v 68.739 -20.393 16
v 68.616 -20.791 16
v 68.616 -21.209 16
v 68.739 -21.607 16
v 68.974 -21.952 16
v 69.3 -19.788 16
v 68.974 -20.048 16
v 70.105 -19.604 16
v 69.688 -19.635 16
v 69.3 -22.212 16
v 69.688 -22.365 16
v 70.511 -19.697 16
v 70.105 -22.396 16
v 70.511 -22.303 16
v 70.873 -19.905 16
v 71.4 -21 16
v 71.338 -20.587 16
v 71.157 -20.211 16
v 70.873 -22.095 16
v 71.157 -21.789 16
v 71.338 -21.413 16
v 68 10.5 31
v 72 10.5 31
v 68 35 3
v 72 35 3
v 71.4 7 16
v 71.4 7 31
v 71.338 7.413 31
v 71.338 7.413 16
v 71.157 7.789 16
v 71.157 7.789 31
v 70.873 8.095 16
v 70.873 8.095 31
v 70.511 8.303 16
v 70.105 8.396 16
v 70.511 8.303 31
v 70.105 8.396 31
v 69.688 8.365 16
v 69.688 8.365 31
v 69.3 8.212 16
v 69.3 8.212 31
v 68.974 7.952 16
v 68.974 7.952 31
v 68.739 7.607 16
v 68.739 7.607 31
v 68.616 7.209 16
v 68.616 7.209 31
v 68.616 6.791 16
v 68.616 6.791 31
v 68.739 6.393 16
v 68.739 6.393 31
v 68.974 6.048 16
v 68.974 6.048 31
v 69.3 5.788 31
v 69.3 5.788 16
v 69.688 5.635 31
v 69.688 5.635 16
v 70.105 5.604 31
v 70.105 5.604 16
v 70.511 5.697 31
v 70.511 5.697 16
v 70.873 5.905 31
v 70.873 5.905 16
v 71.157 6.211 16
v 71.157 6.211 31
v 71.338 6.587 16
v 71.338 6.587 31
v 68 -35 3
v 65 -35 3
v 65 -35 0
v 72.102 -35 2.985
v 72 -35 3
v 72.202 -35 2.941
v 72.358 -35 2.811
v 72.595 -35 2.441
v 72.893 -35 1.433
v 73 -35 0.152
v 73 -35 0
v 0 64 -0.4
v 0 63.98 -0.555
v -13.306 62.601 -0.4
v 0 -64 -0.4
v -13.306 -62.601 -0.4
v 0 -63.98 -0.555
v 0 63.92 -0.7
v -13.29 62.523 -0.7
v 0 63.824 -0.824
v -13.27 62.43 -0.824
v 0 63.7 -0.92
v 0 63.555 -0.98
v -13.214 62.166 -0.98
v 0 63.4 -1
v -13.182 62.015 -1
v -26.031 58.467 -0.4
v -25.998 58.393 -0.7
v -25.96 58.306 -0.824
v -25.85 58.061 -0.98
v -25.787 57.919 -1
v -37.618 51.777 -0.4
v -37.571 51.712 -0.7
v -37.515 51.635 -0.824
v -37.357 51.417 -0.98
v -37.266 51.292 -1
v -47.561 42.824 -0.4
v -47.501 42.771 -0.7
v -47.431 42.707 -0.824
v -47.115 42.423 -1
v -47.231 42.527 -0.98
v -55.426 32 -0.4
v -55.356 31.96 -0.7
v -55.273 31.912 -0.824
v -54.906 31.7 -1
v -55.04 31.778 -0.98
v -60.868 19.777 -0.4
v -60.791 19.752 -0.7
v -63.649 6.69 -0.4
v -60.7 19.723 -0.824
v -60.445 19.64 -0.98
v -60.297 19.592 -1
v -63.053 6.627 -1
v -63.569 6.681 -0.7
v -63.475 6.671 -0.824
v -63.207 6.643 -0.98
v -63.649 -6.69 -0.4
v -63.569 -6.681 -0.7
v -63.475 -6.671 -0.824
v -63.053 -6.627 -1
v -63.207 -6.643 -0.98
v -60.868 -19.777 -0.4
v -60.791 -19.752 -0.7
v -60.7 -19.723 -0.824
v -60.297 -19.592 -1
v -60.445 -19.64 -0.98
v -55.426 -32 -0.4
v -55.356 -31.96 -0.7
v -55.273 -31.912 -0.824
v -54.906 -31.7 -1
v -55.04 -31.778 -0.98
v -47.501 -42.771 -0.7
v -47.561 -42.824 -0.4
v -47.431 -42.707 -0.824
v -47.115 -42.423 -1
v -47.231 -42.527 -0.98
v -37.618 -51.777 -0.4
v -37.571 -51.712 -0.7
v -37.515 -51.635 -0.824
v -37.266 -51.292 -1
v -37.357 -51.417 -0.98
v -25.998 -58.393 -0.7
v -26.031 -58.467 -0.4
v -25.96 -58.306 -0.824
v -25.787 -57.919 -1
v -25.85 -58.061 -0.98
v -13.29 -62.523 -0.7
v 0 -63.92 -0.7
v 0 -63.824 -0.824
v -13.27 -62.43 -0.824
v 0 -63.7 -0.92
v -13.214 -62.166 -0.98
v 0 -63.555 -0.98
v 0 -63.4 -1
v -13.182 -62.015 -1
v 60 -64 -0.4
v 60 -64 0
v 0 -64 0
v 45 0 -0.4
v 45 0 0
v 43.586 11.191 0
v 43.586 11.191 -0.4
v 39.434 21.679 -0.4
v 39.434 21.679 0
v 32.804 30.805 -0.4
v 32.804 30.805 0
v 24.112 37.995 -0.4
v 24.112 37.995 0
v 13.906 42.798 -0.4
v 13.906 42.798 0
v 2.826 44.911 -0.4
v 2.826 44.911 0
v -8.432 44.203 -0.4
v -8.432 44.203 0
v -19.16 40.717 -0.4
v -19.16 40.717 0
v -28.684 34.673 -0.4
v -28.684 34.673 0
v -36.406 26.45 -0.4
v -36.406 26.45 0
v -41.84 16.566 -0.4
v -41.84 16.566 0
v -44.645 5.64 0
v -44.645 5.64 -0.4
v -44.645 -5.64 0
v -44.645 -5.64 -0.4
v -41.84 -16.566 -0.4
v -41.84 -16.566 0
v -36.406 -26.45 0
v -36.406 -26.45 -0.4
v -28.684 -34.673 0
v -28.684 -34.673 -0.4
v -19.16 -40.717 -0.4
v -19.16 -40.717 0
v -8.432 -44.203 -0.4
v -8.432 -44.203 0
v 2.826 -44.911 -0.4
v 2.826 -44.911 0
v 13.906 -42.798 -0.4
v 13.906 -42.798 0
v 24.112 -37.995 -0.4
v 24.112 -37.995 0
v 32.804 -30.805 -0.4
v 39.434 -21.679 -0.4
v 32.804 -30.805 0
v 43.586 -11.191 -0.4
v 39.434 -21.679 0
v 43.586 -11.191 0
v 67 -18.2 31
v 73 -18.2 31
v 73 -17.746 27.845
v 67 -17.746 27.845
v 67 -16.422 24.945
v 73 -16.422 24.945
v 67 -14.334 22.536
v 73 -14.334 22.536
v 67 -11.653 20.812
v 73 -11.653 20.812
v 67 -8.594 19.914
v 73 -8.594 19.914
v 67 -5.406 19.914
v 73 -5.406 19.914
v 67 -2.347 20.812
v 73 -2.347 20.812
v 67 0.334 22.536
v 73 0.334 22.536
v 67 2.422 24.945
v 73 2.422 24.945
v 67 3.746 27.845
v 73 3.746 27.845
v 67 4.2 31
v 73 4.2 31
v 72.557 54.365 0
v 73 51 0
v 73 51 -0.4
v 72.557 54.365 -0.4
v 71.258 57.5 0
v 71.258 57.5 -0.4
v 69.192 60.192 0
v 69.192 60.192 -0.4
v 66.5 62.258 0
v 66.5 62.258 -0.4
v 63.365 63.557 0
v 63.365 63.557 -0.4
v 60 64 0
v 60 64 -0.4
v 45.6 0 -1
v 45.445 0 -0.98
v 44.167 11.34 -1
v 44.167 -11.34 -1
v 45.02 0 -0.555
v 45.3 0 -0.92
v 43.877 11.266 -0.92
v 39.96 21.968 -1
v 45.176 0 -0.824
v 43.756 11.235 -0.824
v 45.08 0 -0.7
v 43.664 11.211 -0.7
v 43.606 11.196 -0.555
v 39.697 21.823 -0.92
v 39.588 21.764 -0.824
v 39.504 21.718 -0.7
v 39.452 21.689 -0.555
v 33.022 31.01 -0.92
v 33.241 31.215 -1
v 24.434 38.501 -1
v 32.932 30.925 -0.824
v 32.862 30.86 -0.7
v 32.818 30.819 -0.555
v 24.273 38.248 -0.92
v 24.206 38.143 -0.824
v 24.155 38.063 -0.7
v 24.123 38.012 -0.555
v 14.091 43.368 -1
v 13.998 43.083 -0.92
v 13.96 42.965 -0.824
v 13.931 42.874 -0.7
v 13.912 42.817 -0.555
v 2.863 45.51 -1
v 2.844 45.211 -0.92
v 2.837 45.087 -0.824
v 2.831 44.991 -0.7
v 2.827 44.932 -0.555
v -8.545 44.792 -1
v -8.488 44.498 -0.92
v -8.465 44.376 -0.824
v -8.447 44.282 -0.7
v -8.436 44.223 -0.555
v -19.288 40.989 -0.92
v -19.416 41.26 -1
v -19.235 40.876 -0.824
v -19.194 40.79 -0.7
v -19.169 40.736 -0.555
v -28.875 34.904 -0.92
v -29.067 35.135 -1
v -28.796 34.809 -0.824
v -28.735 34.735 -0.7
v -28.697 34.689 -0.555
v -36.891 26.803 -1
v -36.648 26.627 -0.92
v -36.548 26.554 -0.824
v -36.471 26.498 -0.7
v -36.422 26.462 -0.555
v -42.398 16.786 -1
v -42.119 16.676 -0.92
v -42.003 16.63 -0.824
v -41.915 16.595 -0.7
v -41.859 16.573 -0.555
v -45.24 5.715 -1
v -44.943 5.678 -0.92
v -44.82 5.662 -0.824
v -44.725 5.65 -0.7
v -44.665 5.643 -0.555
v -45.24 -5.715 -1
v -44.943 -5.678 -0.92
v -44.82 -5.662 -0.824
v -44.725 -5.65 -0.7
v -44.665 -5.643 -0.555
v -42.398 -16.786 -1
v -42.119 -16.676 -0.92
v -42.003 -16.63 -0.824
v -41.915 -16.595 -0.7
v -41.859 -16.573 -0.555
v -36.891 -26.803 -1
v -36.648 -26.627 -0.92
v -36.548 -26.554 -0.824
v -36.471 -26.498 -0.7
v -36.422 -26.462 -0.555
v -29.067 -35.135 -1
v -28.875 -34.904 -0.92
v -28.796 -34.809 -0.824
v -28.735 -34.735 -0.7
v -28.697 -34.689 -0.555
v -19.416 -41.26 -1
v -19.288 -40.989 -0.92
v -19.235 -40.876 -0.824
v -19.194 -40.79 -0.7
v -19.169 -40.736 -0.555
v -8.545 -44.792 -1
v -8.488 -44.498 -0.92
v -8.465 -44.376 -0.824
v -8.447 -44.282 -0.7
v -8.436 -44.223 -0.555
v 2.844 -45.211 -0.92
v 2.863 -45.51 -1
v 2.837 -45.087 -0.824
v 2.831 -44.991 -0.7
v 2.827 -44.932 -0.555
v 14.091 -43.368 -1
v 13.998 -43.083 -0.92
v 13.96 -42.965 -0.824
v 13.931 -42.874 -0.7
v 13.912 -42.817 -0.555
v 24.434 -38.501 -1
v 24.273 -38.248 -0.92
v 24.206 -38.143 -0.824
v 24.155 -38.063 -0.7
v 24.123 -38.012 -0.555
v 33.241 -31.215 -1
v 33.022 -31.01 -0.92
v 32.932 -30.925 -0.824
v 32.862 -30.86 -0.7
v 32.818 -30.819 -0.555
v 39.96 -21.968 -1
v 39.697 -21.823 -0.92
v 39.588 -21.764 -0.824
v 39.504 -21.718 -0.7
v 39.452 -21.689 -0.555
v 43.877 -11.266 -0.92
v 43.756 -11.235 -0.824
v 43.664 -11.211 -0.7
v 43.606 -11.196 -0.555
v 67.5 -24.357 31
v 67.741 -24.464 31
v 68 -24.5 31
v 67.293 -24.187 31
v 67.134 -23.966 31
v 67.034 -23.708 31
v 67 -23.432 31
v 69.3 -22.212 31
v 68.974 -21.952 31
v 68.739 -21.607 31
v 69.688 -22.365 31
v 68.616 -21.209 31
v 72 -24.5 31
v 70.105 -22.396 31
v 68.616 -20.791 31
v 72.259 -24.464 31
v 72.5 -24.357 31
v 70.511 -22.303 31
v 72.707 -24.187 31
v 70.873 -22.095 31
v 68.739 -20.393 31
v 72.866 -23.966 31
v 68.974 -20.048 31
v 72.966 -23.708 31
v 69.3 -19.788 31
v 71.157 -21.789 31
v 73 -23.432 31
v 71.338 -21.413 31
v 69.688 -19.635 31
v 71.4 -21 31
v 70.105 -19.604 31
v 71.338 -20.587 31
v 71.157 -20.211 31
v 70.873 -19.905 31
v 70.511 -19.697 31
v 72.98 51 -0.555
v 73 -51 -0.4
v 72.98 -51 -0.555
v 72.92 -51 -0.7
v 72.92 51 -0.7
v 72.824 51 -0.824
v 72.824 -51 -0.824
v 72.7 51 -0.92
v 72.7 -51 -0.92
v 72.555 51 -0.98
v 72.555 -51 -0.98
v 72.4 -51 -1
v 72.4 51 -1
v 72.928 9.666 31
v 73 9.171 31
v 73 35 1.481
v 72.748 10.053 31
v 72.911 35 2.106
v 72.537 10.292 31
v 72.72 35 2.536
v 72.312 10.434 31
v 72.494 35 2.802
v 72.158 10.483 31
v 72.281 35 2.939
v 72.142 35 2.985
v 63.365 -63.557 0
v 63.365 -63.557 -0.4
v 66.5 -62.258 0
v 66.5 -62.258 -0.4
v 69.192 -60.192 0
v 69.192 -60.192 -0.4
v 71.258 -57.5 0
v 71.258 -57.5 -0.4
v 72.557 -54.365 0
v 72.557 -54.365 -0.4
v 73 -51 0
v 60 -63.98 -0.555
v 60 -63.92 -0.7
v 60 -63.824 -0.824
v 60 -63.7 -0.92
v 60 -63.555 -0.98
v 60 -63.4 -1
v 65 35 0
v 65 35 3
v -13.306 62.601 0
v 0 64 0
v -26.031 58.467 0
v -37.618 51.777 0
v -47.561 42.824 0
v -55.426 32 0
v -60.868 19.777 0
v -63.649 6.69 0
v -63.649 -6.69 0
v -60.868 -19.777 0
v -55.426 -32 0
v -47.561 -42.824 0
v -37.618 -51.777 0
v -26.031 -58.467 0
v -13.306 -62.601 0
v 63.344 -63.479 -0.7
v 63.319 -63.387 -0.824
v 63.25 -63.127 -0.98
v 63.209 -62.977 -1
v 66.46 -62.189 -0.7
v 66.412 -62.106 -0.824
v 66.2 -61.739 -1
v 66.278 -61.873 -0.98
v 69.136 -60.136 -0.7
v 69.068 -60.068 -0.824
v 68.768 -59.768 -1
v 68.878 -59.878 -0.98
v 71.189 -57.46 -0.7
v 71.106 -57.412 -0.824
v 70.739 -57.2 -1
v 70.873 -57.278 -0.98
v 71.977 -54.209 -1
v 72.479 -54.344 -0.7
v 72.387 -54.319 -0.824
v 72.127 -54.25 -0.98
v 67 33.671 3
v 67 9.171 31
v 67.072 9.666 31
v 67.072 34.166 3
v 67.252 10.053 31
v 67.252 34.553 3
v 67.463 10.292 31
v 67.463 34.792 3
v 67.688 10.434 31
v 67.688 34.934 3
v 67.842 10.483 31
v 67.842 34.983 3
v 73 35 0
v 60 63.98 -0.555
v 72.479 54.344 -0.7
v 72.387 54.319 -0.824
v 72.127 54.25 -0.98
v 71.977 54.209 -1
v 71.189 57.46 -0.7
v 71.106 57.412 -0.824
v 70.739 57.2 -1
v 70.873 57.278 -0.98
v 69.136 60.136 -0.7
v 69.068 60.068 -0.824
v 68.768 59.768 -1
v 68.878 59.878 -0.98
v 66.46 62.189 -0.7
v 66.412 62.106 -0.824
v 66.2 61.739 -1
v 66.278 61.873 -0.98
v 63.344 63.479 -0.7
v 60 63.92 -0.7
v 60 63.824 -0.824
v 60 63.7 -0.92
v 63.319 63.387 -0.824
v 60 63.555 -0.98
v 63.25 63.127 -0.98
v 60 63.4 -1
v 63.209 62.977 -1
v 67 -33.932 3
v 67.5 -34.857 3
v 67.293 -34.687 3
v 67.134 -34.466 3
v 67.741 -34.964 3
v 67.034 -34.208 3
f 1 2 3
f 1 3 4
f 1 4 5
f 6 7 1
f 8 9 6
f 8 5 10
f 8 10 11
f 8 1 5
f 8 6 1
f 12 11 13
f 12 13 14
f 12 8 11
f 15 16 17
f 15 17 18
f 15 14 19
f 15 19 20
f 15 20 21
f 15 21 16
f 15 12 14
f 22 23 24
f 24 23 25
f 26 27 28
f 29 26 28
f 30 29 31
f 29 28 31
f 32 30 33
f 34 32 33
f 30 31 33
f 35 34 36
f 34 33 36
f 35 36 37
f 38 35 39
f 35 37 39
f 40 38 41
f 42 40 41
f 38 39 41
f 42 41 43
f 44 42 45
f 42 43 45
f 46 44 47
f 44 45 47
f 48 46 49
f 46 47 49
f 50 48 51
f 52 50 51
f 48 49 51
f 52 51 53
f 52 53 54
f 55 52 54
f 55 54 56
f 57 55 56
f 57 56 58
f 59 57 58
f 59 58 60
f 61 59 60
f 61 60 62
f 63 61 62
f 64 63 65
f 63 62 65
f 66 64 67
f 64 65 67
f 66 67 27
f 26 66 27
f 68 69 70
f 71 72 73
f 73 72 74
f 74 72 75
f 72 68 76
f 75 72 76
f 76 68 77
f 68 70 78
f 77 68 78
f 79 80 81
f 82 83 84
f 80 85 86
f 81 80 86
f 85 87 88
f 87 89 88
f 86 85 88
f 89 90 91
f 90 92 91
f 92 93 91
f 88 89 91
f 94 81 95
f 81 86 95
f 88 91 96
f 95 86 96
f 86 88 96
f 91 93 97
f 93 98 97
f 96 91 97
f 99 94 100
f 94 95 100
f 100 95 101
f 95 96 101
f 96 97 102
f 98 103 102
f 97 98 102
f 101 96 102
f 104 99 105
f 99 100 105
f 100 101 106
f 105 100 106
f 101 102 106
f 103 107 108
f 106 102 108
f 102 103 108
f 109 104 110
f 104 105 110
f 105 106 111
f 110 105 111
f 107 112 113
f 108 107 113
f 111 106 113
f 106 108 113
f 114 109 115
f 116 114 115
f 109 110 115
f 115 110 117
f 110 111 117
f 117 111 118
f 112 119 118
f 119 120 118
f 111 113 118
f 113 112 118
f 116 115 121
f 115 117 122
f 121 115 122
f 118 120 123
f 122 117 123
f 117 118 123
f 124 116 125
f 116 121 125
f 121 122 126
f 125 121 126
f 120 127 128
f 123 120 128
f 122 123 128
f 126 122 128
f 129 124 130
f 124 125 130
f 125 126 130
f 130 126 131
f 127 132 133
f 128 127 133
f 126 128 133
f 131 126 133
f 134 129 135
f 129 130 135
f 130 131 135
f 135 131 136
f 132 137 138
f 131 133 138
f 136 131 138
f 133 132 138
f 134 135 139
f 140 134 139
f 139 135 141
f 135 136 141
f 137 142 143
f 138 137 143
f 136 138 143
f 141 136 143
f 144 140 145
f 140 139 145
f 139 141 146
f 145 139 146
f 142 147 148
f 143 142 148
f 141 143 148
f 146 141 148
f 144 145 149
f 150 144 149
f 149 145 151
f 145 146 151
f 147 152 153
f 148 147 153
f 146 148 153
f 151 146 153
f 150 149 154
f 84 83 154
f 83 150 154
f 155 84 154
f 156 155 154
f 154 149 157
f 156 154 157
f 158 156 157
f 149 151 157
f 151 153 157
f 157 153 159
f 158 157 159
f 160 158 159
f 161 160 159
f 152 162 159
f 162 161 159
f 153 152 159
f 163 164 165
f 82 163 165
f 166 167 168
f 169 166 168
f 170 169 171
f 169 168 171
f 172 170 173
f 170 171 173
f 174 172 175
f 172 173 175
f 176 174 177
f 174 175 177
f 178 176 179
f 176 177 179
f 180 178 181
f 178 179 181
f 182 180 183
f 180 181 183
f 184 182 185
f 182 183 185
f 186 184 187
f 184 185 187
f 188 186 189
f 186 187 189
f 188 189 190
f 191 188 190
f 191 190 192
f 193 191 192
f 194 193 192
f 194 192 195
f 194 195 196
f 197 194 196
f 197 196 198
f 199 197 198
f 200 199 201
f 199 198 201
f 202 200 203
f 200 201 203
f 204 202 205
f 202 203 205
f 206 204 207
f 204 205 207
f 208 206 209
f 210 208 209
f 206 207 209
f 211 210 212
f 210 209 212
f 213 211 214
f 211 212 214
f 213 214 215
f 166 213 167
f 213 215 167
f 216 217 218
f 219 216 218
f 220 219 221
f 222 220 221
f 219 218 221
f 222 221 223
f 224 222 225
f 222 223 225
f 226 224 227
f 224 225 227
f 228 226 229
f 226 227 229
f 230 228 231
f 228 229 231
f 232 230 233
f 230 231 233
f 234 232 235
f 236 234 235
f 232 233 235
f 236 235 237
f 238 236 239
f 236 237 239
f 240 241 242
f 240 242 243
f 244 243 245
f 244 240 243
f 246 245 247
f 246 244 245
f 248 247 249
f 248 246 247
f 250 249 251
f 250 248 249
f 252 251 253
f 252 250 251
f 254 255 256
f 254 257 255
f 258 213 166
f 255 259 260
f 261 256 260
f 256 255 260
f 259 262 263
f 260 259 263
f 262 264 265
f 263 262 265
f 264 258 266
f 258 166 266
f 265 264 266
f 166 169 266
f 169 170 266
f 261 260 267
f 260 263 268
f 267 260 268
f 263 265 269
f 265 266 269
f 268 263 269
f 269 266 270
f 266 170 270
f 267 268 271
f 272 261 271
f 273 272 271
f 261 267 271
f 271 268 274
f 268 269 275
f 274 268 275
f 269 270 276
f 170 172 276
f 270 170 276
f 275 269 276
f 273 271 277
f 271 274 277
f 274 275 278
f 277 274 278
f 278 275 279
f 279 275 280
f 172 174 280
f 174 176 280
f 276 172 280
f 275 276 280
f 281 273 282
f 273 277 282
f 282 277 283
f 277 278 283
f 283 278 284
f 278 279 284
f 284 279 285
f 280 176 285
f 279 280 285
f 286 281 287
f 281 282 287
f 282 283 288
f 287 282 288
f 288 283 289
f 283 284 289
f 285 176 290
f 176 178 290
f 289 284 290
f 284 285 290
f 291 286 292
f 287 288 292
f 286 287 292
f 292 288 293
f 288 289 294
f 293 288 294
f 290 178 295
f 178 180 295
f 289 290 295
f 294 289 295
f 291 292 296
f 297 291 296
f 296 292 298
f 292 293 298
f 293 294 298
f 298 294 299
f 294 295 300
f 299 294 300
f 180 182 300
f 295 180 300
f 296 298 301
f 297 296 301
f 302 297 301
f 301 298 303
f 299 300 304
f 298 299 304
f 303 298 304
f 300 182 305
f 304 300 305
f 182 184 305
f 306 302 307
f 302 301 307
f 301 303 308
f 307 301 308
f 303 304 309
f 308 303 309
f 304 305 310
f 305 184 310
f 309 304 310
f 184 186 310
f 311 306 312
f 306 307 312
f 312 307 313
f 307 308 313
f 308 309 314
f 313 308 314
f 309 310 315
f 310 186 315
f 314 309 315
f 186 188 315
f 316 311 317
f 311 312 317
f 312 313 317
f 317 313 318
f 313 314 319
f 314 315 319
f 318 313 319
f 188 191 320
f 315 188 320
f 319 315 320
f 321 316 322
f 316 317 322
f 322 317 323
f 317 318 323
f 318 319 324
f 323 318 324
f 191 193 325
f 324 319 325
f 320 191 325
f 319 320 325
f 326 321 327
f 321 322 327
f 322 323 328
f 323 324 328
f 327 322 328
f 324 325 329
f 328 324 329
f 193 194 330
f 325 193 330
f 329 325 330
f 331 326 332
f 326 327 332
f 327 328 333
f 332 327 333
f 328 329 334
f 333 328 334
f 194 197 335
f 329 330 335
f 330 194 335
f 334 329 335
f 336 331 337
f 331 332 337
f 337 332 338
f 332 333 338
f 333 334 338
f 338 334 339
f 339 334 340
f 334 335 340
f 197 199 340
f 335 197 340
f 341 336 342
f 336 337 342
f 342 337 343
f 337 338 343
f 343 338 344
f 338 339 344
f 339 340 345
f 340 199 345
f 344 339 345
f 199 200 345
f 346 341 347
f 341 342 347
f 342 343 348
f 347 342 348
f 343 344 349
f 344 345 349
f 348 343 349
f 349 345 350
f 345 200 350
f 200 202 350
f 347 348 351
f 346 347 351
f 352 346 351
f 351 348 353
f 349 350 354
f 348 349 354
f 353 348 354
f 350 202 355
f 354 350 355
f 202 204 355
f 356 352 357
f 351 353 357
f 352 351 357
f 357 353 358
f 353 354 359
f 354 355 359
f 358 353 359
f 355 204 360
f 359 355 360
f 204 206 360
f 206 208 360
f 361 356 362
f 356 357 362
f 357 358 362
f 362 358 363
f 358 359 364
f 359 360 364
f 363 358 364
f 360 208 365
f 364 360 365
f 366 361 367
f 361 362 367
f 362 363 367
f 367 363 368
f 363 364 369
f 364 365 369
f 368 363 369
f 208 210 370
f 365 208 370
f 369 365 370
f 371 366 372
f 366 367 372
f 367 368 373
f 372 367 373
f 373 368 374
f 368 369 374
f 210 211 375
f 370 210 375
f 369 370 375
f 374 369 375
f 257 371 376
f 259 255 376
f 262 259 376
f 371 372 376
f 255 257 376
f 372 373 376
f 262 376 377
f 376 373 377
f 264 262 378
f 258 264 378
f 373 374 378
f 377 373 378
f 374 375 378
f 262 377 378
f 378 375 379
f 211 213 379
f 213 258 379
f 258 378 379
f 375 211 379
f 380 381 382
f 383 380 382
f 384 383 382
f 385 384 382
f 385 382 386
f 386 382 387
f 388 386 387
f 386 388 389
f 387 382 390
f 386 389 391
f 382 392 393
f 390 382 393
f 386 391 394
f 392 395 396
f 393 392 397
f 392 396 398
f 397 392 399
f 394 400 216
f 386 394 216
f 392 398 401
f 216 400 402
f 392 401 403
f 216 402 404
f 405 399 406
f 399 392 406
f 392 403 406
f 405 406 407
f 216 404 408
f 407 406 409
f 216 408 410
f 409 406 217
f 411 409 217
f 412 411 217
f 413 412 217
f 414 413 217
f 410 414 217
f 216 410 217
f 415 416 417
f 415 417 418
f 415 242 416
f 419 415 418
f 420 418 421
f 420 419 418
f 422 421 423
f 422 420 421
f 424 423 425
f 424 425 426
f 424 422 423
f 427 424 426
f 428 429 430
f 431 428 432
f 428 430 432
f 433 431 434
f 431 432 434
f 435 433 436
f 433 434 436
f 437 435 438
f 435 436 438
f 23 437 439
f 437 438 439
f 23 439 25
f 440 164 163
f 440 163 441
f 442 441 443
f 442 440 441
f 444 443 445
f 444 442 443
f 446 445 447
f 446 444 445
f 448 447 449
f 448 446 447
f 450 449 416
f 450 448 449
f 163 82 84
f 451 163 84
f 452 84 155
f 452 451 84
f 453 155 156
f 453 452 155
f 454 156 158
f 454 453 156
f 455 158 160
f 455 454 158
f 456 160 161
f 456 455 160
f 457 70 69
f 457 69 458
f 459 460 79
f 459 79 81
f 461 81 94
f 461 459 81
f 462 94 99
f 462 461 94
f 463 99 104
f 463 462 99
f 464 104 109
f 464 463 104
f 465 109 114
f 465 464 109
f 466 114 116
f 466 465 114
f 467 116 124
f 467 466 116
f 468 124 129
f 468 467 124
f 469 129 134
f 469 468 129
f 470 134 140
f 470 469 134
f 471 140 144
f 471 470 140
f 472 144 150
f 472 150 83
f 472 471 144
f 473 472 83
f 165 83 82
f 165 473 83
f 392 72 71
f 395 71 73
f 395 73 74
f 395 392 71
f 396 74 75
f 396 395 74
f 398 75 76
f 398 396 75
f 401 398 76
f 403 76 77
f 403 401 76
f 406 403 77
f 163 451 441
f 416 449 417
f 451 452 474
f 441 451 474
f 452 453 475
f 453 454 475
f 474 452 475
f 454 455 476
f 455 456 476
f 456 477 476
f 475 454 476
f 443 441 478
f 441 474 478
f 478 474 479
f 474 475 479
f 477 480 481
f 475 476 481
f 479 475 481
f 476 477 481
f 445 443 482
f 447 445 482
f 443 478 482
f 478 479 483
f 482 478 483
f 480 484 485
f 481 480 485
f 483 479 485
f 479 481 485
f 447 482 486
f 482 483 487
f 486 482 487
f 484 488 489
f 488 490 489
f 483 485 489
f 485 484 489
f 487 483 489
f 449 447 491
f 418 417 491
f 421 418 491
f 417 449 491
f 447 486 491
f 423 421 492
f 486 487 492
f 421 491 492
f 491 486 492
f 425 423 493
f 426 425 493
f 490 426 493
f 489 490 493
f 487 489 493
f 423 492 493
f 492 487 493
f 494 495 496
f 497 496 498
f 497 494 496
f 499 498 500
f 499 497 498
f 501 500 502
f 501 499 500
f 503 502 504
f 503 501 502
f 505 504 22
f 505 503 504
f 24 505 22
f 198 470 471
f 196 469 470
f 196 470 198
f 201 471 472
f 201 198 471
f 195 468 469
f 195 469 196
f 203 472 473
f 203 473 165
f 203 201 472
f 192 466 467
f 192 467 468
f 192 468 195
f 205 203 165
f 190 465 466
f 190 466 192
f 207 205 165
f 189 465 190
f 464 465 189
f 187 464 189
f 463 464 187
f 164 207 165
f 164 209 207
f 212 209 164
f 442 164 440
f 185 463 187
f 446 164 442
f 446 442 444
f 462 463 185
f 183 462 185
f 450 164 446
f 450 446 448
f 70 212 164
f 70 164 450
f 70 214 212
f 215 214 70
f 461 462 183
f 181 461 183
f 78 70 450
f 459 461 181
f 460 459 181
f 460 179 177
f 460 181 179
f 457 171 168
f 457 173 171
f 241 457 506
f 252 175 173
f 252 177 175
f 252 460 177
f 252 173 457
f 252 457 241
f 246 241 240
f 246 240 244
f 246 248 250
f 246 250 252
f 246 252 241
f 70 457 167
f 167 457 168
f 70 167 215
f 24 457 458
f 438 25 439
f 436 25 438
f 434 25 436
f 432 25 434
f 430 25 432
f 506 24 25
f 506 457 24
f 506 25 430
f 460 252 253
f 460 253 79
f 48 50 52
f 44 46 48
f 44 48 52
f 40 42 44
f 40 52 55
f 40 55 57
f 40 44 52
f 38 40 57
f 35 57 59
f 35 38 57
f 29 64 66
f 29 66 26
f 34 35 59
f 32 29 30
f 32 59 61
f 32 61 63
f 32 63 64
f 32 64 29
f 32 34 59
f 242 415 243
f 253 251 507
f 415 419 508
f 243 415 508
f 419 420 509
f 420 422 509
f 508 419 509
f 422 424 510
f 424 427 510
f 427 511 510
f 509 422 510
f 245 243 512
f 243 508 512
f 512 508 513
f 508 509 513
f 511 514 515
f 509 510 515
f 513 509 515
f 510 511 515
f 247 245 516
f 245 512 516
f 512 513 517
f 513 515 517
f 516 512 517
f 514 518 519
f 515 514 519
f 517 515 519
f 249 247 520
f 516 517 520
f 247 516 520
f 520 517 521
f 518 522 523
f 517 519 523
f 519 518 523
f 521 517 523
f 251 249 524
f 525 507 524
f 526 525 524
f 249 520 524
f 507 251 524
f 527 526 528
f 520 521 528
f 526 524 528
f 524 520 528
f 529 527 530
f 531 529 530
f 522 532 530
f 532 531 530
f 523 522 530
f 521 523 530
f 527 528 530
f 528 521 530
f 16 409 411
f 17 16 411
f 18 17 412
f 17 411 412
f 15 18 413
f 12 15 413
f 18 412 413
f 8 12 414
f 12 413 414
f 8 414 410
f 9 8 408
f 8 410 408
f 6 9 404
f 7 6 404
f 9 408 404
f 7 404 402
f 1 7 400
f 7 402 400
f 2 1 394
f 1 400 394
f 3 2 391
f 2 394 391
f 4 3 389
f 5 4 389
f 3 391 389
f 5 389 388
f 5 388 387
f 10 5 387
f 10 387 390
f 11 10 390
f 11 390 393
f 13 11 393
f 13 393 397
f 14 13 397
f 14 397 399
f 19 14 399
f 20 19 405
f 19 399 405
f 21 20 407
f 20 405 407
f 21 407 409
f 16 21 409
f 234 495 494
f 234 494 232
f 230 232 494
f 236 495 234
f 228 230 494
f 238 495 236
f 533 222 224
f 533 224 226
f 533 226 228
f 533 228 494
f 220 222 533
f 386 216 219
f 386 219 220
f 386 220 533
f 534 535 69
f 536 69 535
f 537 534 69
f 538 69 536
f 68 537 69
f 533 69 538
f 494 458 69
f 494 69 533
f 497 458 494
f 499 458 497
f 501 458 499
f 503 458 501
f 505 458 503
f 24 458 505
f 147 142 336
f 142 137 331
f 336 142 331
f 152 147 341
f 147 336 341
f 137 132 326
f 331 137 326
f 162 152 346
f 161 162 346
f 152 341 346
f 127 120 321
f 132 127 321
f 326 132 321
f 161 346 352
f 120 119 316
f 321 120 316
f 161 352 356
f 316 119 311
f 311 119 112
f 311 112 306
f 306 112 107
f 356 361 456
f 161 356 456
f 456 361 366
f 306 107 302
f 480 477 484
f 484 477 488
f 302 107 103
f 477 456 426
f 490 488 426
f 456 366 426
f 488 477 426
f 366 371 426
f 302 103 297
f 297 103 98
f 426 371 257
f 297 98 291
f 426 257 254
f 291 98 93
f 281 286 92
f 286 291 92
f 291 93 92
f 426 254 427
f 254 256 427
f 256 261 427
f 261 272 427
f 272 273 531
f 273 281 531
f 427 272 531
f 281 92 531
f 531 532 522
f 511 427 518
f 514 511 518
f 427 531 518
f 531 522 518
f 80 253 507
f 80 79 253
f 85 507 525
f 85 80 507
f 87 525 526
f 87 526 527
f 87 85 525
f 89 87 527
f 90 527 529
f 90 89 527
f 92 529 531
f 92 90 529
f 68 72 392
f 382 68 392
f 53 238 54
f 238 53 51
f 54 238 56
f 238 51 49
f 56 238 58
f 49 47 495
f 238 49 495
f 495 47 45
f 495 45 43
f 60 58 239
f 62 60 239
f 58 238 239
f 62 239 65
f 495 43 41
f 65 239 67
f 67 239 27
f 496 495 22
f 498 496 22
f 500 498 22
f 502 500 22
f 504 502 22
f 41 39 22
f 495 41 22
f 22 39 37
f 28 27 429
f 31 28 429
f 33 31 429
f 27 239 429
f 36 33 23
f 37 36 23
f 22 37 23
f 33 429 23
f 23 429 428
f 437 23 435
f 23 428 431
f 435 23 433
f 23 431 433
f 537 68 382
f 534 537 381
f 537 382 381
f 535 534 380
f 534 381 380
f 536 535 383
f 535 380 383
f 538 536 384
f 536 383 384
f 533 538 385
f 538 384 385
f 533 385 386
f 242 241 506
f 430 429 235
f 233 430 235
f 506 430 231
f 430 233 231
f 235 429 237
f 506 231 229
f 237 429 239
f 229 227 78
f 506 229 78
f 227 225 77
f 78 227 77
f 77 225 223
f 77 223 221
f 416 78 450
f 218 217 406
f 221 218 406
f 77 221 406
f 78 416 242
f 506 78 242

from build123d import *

# Parameters (mm, degrees)
SKETCH001_R     = 45
PAD_DEPTH       = 1
SKETCH_W        = 8
SKETCH_H        = 70
PAD003_DEPTH    = 3
FILLET_R        = 0.6
PAD006_DEPTH    = 6
SKETCH015_R     = 1.4
POCKET008_DEPTH = 15
FILLET008_R     = 1


with BuildPart() as part:
    # Sketch001 → Pad (new body)
    with BuildSketch(Plane.XY):
        with BuildLine():
            Line((60, 64), (0, 64))
            ThreePointArc((0, 64), (-63.999918, 0), (0, -64))
            Line((60, -64), (0, -64))
            ThreePointArc((60, -64), (69.192388, -60.192388), (73, -51))
            Line((73, 51), (73, -51))
            ThreePointArc((73, 51), (69.192388, 60.192388), (60, 64))
        make_face()
        Circle(SKETCH001_R, mode=Mode.SUBTRACT)
    extrude(amount=-PAD_DEPTH)

    # Sketch → Pad003 (new body)
    with BuildSketch(Plane.XY):
        with Locations((69, 0)):
            Rectangle(SKETCH_W, SKETCH_H)
    extrude(amount=PAD003_DEPTH)

    # Fillet
    fillet_edges = [part.edges().sort_by_distance(p)[0] for p in [
        (69.192388, 60.192388, -1),
        (30, 64, -1),
        (-63.999918, 0, -1),
        (30, -64, -1),
        (69.192388, -60.192388, -1),
        (73, 0, -1),
        (-45, 0, -1),
    ]]
    fillet(fillet_edges, radius=FILLET_R)

    # Sketch014 → Pad006 (new body)
    with BuildSketch(Plane.YZ.offset(73)):
        with BuildLine():
            Line((-35, 3), (-24.5, 31))
            Line((-24.5, 31), (-18.2, 31))
            ThreePointArc((-18.2, 31), (-7, 19.8), (4.2, 31))
            Line((4.2, 31), (10.5, 31))
            Line((10.5, 31), (35, 3))
            Line((35, 3), (-35, 3))
        make_face()
    extrude(amount=-PAD006_DEPTH)

    # Sketch015 → Pocket008 (cut)
    with BuildSketch(Plane.XY.offset(31)):
        with Locations((70, 7)):
            Circle(SKETCH015_R)
        with Locations((70, -21)):
            Circle(SKETCH015_R)
    extrude(amount=-POCKET008_DEPTH, mode=Mode.SUBTRACT)

    # Fillet008
    fillet008_edges = [part.edges().sort_by_distance(p)[0] for p in [
        (73, 22.75, 17),
        (67, 22.75, 17),
        (67, -29.75, 17),
        (73, -29.75, 17),
    ]]
    fillet(fillet008_edges, radius=FILLET008_R)


solid = part.part
